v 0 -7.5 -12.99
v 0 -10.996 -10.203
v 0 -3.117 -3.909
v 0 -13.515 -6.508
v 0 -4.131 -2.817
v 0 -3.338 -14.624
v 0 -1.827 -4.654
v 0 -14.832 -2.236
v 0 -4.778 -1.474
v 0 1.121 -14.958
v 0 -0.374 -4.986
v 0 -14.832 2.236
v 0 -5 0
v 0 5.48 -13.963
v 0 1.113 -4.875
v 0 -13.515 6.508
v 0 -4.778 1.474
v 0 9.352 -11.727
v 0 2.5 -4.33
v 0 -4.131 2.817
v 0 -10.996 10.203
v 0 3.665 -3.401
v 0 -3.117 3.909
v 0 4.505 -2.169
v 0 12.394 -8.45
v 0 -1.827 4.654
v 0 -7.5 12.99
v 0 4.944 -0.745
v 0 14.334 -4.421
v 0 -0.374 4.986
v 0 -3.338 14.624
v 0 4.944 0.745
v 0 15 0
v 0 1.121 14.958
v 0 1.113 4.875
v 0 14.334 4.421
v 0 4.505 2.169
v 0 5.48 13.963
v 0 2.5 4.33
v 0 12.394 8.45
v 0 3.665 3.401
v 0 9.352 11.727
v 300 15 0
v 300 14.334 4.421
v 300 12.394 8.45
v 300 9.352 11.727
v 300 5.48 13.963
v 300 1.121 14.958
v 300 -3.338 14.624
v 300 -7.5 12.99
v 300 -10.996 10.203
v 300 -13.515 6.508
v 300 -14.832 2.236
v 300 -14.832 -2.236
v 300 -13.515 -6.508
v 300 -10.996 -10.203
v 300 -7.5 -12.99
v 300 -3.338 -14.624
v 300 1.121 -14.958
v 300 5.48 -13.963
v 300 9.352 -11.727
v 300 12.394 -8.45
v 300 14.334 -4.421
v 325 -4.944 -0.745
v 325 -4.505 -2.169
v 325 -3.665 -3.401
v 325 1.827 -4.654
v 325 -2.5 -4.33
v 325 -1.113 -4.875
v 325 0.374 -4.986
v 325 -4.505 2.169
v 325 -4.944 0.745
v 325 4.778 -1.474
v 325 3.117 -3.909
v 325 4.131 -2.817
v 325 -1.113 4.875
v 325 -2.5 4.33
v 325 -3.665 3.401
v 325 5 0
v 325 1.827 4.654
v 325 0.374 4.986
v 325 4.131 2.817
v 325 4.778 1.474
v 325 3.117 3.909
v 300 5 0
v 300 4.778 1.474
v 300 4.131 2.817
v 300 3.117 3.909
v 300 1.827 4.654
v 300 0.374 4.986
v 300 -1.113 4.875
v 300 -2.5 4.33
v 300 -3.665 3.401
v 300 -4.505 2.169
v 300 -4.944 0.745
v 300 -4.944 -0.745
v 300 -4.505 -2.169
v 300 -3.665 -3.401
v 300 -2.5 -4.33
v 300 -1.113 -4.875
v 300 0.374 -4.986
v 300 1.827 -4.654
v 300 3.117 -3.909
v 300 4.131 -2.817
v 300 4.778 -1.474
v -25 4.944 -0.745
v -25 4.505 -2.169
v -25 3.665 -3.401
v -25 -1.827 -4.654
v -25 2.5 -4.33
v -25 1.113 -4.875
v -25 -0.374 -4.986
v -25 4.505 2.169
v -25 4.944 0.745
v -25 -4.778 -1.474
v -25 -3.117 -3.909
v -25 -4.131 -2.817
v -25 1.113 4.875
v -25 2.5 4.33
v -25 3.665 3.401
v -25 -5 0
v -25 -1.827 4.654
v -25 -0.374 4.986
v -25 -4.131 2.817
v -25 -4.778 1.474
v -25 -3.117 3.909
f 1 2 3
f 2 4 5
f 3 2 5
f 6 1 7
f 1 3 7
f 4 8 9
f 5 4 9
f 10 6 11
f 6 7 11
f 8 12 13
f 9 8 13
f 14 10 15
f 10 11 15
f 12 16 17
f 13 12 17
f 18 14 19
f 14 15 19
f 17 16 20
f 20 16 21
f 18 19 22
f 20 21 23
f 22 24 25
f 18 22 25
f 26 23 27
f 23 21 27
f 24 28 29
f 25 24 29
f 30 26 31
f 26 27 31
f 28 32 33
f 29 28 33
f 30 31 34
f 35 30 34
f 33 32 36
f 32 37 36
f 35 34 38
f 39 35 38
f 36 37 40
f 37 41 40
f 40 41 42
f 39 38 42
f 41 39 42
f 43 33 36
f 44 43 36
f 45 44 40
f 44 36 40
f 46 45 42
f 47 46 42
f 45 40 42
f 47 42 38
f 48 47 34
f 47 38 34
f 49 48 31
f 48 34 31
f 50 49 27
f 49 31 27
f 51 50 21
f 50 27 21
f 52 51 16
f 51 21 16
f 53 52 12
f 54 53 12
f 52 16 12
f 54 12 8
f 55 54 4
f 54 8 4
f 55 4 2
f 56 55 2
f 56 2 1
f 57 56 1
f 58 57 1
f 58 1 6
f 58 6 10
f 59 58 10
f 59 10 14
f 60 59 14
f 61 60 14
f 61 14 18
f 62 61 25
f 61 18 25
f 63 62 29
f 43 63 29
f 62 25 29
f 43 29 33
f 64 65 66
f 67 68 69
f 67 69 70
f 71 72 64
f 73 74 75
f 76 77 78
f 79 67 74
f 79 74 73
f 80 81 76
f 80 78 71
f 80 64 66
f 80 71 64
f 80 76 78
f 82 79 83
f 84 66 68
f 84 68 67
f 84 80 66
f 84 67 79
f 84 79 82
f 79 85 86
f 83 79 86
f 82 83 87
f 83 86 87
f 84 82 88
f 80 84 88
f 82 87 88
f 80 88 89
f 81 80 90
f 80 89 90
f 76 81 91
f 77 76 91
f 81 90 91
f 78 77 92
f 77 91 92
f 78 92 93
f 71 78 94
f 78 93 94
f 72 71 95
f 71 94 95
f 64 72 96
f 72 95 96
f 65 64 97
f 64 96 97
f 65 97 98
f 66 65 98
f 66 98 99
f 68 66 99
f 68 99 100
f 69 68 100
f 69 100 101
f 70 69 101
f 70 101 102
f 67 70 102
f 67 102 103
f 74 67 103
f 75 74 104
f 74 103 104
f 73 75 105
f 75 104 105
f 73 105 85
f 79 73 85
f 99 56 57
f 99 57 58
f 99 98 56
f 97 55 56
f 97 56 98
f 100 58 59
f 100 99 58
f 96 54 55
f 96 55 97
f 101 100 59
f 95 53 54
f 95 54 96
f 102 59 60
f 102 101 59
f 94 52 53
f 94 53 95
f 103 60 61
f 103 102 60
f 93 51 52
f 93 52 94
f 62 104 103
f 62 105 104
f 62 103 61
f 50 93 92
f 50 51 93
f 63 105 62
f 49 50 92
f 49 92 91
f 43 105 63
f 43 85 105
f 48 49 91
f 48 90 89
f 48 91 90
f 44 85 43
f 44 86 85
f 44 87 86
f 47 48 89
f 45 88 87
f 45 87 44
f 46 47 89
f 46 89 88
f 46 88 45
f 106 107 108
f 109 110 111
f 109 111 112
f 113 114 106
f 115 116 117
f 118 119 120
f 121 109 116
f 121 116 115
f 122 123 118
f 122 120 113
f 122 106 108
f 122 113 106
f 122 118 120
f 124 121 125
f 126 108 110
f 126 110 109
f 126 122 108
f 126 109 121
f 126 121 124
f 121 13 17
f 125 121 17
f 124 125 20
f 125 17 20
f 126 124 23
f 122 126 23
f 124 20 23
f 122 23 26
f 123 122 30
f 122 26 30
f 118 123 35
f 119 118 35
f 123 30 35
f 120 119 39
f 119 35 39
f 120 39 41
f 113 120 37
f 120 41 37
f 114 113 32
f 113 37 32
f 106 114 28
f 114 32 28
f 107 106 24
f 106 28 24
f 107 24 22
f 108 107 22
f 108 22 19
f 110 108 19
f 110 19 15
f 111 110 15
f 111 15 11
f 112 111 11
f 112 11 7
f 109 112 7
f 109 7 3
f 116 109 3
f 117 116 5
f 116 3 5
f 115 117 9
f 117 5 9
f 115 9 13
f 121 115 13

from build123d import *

# Parameters (mm, degrees)
F0_R     = 15
F1_DEPTH = 300
F2_R     = 5
F3_DEPTH = 25
F4_R     = 5
F5_DEPTH = 25


with BuildPart() as f1:
    # F0 (on Right) → F1 (new body)
    with BuildSketch(Plane.YZ):
        Circle(F0_R)
    extrude(amount=F1_DEPTH)

    # F2 (on face) → F3 (join)
    with BuildSketch(Plane(origin=(0, 0, 0), x_dir=(0, -1, 0), z_dir=(-1, 0, 0))):
        Circle(F2_R)
    extrude(amount=F3_DEPTH)

    # F4 (on face) → F5 (join)
    with BuildSketch(Plane.YZ.offset(300)):
        Circle(F4_R)
    extrude(amount=F5_DEPTH)


solid = f1.part
